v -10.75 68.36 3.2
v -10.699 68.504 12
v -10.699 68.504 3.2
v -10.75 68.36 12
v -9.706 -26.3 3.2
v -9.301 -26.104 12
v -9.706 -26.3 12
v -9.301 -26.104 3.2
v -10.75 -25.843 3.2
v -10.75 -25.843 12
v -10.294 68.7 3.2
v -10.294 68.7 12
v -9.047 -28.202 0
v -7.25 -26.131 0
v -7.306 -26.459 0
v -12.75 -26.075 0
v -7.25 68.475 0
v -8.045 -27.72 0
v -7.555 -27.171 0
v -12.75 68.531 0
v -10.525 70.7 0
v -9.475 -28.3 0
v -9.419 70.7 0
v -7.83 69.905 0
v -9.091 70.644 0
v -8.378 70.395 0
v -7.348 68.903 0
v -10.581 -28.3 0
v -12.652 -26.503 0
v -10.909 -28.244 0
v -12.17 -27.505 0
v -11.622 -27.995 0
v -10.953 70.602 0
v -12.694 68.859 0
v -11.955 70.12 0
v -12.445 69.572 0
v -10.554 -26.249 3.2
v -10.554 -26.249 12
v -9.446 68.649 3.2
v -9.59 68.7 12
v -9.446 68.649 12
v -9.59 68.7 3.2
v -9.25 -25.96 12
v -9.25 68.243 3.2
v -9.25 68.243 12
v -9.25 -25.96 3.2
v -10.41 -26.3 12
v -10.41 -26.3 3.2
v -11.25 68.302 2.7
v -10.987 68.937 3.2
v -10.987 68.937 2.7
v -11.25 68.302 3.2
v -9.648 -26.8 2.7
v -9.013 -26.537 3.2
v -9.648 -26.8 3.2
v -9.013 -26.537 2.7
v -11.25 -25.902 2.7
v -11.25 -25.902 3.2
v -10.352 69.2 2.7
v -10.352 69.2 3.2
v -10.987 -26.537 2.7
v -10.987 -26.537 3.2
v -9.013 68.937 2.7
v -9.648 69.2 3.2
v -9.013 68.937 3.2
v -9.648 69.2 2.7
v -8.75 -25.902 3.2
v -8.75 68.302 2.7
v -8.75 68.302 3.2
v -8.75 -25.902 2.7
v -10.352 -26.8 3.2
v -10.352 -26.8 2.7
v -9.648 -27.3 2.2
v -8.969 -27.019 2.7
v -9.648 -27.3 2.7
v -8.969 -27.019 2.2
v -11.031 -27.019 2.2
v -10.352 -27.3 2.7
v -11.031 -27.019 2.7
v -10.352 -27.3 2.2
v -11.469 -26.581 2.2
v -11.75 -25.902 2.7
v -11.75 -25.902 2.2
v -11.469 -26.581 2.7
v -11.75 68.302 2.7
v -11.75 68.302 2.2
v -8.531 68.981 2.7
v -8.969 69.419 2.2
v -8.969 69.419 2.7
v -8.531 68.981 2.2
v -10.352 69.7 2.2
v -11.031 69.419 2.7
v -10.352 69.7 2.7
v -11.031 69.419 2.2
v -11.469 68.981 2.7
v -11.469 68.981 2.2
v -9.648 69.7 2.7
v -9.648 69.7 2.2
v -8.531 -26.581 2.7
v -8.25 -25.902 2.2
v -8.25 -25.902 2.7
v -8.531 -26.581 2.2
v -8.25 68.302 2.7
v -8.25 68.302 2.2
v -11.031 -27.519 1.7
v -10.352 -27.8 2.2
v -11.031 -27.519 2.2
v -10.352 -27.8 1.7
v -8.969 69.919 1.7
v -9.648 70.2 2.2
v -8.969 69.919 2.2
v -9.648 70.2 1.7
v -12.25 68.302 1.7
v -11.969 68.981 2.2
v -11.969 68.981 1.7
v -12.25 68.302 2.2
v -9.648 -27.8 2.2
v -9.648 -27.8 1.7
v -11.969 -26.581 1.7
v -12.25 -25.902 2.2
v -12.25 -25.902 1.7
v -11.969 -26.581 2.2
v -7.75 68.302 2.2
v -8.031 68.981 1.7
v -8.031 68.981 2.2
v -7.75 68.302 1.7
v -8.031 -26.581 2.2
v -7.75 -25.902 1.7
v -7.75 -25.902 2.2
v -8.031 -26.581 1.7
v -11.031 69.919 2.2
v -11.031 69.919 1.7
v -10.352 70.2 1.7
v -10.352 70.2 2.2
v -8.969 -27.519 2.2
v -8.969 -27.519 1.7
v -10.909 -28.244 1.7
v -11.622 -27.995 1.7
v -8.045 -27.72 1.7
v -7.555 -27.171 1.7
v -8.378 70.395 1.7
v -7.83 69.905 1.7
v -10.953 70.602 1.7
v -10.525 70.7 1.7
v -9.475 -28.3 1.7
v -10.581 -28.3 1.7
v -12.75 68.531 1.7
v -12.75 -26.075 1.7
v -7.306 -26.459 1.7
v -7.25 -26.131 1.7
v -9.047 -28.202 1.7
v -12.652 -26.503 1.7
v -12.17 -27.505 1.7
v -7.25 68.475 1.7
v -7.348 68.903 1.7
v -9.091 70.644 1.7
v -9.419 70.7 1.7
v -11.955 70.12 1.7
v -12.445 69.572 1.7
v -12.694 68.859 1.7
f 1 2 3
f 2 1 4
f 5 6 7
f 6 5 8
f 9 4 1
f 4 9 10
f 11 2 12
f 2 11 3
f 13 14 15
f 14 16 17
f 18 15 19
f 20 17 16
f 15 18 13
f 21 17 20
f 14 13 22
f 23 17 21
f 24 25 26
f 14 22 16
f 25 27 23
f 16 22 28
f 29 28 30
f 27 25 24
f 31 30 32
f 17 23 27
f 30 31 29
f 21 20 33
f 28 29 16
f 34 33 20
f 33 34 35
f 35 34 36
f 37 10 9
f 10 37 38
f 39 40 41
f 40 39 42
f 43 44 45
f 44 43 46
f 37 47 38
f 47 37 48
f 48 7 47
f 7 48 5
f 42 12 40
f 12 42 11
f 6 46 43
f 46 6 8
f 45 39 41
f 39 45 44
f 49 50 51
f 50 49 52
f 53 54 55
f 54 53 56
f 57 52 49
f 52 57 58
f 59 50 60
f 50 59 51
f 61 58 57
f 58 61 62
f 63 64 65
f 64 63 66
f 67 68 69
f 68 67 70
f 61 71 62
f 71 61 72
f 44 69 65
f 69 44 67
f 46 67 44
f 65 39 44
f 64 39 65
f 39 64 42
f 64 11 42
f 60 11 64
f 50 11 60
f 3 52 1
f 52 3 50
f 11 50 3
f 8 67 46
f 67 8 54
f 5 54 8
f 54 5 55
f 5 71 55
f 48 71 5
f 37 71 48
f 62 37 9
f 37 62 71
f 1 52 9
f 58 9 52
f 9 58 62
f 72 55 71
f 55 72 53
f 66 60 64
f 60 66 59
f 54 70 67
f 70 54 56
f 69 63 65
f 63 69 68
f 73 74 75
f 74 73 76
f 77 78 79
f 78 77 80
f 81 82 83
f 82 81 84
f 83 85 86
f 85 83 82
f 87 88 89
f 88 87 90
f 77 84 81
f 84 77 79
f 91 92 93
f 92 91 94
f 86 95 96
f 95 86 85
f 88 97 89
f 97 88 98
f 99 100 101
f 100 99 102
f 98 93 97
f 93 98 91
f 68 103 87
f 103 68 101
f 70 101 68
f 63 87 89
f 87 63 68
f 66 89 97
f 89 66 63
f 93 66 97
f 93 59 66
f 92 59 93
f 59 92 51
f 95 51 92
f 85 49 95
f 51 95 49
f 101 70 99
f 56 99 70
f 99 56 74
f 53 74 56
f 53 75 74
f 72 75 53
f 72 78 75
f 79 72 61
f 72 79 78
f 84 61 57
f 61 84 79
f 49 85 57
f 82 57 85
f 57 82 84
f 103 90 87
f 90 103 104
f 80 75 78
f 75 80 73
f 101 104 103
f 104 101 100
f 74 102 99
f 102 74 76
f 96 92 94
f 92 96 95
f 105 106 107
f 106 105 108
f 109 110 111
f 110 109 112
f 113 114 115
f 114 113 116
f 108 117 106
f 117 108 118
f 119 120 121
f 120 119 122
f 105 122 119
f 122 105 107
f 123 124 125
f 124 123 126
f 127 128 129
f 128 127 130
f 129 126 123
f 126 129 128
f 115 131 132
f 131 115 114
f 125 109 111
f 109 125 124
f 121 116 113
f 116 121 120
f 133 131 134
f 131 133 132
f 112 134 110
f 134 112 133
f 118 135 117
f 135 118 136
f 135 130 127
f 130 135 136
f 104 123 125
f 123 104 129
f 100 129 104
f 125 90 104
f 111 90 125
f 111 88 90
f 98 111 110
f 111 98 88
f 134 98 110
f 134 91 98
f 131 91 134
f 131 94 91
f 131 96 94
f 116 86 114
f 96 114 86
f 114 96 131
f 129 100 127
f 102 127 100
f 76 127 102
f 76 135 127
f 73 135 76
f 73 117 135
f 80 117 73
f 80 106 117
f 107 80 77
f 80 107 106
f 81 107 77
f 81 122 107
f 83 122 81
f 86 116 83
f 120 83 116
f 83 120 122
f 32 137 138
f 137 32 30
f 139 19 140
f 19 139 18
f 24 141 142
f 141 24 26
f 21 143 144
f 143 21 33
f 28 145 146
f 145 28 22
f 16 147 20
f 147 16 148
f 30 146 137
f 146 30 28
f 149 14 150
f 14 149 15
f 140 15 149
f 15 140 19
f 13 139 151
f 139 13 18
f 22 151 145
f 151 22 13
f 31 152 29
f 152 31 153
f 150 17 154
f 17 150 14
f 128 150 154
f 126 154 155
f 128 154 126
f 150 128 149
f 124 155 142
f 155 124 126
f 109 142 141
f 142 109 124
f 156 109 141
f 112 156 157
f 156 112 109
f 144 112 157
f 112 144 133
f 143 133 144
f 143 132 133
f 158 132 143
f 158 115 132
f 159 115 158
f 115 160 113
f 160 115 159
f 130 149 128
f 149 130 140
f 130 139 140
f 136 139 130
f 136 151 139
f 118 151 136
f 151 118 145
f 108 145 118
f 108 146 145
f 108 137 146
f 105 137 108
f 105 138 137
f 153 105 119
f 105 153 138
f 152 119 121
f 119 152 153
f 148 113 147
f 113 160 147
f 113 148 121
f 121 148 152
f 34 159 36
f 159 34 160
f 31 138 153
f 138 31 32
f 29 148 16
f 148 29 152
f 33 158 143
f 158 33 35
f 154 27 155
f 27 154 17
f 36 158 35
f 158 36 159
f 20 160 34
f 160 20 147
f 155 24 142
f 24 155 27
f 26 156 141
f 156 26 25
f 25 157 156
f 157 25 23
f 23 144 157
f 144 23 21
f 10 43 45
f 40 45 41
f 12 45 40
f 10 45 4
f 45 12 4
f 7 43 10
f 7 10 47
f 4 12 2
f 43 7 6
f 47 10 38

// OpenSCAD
/*
 One driverrack holds: 
   - One Arudino nano daughterboard
   - Two green UN178 brushless motor drivers
 
 (Formerly called "daughterboard", since it had a separate 
  serial connection to a single "motherboard".)
 
 
*/
dxf_name="driver_case_v2_xport.dxf";

// Load a DXF file layer
module dxf(layer_name,convexity=2) {
	s=1; // previously needed to be 90/96 to fix cursed Inkscape DPI switch
	scale([s,s,1])
	import(dxf_name,layer=layer_name,convexity=convexity);
}

floor=1.5;
outerwall=1.5;
outerwall_z=floor+25;

innerwalls=1.5;

circuit_low_z=floor+2.2; // base of UN178 board
circuit_high_z=circuit_low_z+13.3; // base of driver board



// Round inside corners of this outline
module round(fillet) {
	//offset(r=+fillet) offset(r=-fillet)
	offset(r=-fillet) offset(r=+fillet)
		children();
}

// Outer walls
module outline_2D(thickness=outerwall) {
	offset(r=+thickness)
	offset(r=-3) // <- prepared with 3mm wall in mind 
	dxf("outline");
}

// Sensor plug insertion area
module sensors_2D() {
    round=4;
	offset(r=-round) offset(r=+round) 
	offset(r=+round) offset(r=-round) 
    union() {
		//for (shift=[+3,-3]) translate([0,0.5*shift])
				dxf("sensors",convexity=4);
	}
}

// Inner electronics bays
module bays_2D(extra=0) {
	offset(r=1) dxf("circuit");
	//sensors_2D();
	
	// Stiffening rib for electronics
	//if (extra)
	//translate([-14.0,-20]) square([2,23]);
}

// Make grid of thin wires
module dice() {
	difference() {
		children();
		
		union() {
		translate([50,0,0])
		for (dx=[-100:5:+100]) 
		for (plusminus=[+1,-1])
			rotate([0,0,plusminus*45]) translate([dx,0,0]) square([1.0,200],center=true);
		}
	}
}

// Reinforcing along the top edge
module reinforcing_bar(fatten=0)
{    
    offset(r=fatten)
    translate([-10,21.2]) square([1.5,95],center=true);
}

// Add mounting points for M3 hold-down screws
module screw_mounts(height,r,fatten,reinforcing) {
	difference() {
		linear_extrude(height=height,convexity=4)
        round(2.0)
        {
			offset(r=r+fatten) dxf("circuitholes");
            
            // Reinforcing along top edge
            if (reinforcing) reinforcing_bar(fatten);
            
        }
	}
}

// Add "ears" for securing wires with zipties
ear_size=4.5;
module ear_mounts() {
	perimeter=ear_size;
	linear_extrude(height=circuit_low_z,convexity=8)
	difference() {
		offset(r=+perimeter)
			children();
		children();
	}
}

// 2D profile of velcro mounting slot, facing in +Y
velcro_sz=[4,18];
module velcro() {
	round=1.2;
	offset(r=+round) offset(r=-round)
		square(velcro_sz);
	
}


// Main frame, with no add-ons or holes
module frame_3D() {
	// Outer walls
	linear_extrude(height=outerwall_z,convexity=4) 
	difference() {
		outline_2D();
		offset(r=-outerwall) outline_2D();
	}
	
	// Floor
	linear_extrude(height=floor)
	difference() {
		outline_2D();
		//dice() //dxf("vent");
        
        // Big wide ventilation / lightening holes in floor
        round=12;
        offset(r=+round) offset(r=-round) // very rounded
        translate([38,18.5])
        difference() {
            square([70,124],center=true); 
            square([100,15],center=true); // center stripe
        }
	}
	
	// Mini walls around electronics bays
	linear_extrude(height=circuit_high_z-3,convexity=6)
	difference() {
		offset(r=+innerwalls) bays_2D(1);
		bays_2D(1);
	}
}

module whole_frame() {	
	difference() {
		union() {
			difference() {
				frame_3D();
				
			}
			
			// Tapered wall intersection
			intersection() {
				for (taper=[0:0.5:2])
				linear_extrude(height=circuit_low_z-taper)
				round(4)
				{
					offset(4.0+taper) // bosses around UN holes
						dxf("holes");
                    reinforcing_bar(taper); //<- merge into bosses around holes
					//offset(ear_size+taper)
					//	velcro_and_bolts_2D();
					difference() {
						square([1000,1000],center=true);
						outline_2D(-taper);
					}
				}
				linear_extrude(height=outerwall_z)
					outline_2D();
			}
			
			// Back side walls
			difference() {
				union() {
					mount=4.0; // wall around circuit board screw mounts
					screw_mounts(circuit_high_z,mount,0,0);
					screw_mounts(circuit_high_z-5,mount,0,1);
					for (taper=[0:0.5:2]) // stepped bevel to floor
                        screw_mounts(circuit_low_z-taper,mount,taper,1);
				}
				linear_extrude(height=outerwall_z)
				{
					offset(r=0.5) dxf("un178");
					bays_2D();
				}
			}
			
			
				
		}
		
		// Openings for electronics
		translate([0,0,circuit_low_z])
		linear_extrude(height=outerwall_z)
			dxf("insert");
		
		// Punch holes for mounting screws all the way through everything
		translate([0,0,-0.1])
			linear_extrude(height=2*circuit_high_z)
			union() {
				dxf("holes");
				dxf("circuitholes");
			}
		
				
		// Thru holes for bottom-insert stuff
		translate([0,0,-0.1])
		linear_extrude(height=outerwall_z+2)
		union() {
			sensors_2D();
			dxf("rj45");
		}
	}
}

whole_frame();



// Drop raw DXF on top of everything
// color([1,0,0]) translate([0,0,3]) import(dxf_name);
